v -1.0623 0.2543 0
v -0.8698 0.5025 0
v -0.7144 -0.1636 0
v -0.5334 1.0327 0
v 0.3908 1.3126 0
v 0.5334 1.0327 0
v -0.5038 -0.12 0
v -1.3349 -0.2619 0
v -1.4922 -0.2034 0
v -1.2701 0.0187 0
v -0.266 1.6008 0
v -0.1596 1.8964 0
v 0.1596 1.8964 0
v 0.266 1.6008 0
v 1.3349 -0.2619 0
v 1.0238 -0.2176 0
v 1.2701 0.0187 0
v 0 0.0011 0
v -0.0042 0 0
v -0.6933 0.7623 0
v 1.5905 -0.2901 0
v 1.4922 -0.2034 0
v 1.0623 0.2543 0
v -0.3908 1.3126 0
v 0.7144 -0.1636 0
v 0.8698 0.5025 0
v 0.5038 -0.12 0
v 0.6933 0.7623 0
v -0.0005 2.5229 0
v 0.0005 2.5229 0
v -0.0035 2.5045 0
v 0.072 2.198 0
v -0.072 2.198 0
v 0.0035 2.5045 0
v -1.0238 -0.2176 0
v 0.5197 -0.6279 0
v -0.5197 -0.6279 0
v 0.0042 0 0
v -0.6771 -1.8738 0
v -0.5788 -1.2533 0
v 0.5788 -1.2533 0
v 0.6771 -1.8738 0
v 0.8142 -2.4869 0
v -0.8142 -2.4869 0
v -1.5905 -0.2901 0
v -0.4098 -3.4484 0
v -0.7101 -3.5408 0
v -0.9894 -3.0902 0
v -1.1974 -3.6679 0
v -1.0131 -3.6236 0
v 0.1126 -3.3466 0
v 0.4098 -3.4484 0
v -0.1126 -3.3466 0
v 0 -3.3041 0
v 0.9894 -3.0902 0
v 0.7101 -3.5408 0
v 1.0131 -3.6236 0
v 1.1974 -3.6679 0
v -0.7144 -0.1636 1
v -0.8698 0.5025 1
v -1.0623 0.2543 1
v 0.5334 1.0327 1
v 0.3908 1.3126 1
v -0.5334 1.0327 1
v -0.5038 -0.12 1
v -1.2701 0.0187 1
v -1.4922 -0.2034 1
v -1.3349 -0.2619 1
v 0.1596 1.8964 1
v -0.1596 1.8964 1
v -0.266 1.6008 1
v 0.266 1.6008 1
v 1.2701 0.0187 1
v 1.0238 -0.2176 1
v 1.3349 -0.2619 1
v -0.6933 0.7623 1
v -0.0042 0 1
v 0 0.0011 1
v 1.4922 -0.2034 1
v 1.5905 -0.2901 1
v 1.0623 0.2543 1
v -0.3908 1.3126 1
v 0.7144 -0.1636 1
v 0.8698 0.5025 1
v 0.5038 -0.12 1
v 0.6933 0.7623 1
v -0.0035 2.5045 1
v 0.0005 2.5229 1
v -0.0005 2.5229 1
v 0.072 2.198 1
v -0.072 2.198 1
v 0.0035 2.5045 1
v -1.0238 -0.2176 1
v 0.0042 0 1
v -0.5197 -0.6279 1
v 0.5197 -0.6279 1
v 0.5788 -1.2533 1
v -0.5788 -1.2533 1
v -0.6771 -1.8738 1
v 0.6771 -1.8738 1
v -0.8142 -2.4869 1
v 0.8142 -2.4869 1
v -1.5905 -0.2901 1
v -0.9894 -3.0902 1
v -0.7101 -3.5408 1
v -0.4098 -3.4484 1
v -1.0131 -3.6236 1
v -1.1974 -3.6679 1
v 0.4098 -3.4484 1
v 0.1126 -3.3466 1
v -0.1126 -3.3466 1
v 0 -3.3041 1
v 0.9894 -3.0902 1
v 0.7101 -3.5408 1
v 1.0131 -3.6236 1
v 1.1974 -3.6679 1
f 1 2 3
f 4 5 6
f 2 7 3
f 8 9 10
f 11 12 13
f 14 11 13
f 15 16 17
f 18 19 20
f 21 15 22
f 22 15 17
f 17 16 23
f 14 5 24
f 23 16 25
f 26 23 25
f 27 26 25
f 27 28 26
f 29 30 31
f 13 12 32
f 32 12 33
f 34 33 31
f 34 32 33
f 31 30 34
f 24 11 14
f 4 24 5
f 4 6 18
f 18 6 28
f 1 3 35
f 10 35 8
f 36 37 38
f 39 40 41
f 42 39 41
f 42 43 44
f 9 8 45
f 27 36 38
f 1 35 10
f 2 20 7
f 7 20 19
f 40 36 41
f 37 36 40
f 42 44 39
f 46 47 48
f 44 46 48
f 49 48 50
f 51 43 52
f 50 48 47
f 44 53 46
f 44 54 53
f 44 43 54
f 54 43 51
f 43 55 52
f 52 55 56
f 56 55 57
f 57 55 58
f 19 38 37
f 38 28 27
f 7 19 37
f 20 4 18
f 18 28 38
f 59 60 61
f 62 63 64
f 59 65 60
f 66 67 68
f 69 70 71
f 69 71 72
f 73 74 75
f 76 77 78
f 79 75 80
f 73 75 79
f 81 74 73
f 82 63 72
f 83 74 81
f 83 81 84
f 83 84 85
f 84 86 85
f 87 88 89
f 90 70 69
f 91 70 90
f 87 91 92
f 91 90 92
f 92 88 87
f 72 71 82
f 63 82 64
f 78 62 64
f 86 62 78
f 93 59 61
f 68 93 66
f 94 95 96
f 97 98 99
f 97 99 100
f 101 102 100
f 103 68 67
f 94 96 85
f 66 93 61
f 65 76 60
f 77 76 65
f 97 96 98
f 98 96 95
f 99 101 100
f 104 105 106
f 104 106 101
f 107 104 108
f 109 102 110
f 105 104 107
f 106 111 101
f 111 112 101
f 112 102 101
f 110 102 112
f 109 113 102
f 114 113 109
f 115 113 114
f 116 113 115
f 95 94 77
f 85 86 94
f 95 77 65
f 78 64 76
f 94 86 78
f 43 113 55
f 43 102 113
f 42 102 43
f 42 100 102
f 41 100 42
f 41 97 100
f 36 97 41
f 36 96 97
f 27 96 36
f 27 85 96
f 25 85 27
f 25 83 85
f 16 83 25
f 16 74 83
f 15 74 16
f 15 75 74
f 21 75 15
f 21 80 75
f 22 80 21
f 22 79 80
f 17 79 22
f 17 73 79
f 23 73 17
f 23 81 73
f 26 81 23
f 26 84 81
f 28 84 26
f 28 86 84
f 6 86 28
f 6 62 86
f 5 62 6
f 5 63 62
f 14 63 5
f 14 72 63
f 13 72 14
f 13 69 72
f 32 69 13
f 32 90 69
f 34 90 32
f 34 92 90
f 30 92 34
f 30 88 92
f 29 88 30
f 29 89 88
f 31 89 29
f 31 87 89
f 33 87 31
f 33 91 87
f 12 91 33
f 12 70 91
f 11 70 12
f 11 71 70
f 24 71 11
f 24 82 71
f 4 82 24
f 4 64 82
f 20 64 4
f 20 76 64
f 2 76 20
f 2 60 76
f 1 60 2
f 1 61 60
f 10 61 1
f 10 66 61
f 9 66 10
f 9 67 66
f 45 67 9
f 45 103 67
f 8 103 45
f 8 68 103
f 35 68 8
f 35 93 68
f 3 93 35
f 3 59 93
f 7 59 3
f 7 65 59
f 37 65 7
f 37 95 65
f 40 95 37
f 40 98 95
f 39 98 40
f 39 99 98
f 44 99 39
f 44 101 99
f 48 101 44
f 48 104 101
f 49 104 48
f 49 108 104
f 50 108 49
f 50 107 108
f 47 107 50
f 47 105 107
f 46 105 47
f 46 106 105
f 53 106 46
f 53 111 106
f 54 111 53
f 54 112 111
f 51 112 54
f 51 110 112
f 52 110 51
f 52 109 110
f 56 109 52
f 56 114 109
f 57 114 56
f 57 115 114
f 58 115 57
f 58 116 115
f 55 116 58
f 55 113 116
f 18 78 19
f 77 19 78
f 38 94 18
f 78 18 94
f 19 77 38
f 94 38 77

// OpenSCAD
//Name: Curvy Arrow
//Created by Ari M. Diacou, April-June 2015
//Shared under Creative Commons License: Attribution-ShareAlike 3.0 Unported (CC BY-SA 3.0) 
//see http://creativecommons.org/licenses/by-sa/3.0/

//INSTRUCTIONS:
/* The code below produces an arrow with curvy edges. It does this by intersecting and taking the difference of 4 pairs of circles. 2 circles form the tip of the arrow (set1), and 2 form the back of the tip of the arrow(set2). The sides of the shaft are formed by set3, and the tail of the arrow is formed by set 4. 

The circles are specified by a modified polar coordinate system called "easy_form" which is ={distance from origin to circle edge, radius of circle, angle between +x-axis and cicle center in degrees}. This coordinate system is SLIGHTLY easier to get a grasp of entering values. Changing the first value will push a curve farther from the origin (the center of the arrow). Lowering the 2nd number will make a line more curvy (by lowering the radius of the circle it creates). Raising the 2nd number will make a line more flat (by increasing the radius of the circle it creates). Changing the 3rd number is how you get position control. The 3rd number is the angle that the angle that the line connecting the origin and the center of the circle will make with the x-axis.Both the first and the third parameters can be negative. Negative radii will fail silently.

It is highly reccommended that this program be used in OpenSCAD and not customizer. There is no input checking, and a lot of edge cases where circles will not intersect. If instead of an arrow looking thing, cutomizer or OpenSCAD show you two circles floating in space, it means that the circles are not intersecting, and the program is failing silently. If you wish to make a 2D file, use 0 for the height (I dont think this works in customizer).

The last 4 functions in this program are used to calculate the points where the circles intersect, which is used to calculate the length and width of the arrow. This information is available through the echo function, and not visible in customizer. So if you want to know the dimensions of your arrow, use OpenSCAD.*/

//The tip of the arrow [origin to edge, radius, polar position angle] e.g. [1,5,35]
set1=[1,5,35];      
//The back of the arrow tip [origin to edge, radius, polar position angle] e.g. [0,10,75]
set2=[0,10,75];     
//The sides of the shaft [origin to edge, radius, polar position angle] e.g. [.5,10,0]
set3=[.5,10,0];      
//The back of the shaft [origin to edge, radius, polar position angle] e.g. [-1.5,10,60]
set4=[-3,10,60];
//Height of your arrow, use 0 offline to output a DXF file
height=1;

/* HIDDEN */
///// Derived Parameters /////
ep=0.05; //epsilon, a small number
tip= intersection(set1,[set1[0],set1[1],180-set1[2]]); echo(str("tip=",tip));
back=intersection(set3,set4); echo(str("back = ",back));
side=intersection(set1,set2); echo(str("side = ",side));
length=tip[1]-back[1]; echo(str("length = ",length));
width=2*max(side[0],back[0]); echo(str("width = ", width));
//real_height = height < ep ? ep : height; //input handl
/////////// MAIN() //////////
//if the height is less than epsilon, output a 2D file, else: output a 3D file with the specified height. I dont know if customizer can output DXF files, so I think this will only work in OpenSCAD.
if(height < ep)
    arrow();
else
    linear_extrude(height) arrow();
echo(str(
    "A suggested name for your arrow is: curvy_arrow-sets=[",set1,set2,set3,set4,"],h=",height
    ));
///////// FUNCTIONS /////////
function intersection(circle1,circle2)=(norm(intersections(circle1,circle2)[0])<=norm(intersections(circle1,circle2)[1]))?intersections(circle1,circle2)[0]:intersections(circle1,circle2)[1];
function xyr_form(easy_form)=[
    //easy_form={distance from origin to circle edge, radius of circle,angle between +x-axis and cicle center}
    //xyr_form={x-cooridante of center,y-coordinate of center,radius of circle}
    (easy_form[0]+easy_form[1])*cos(easy_form[2]), //x=(diff+r)*cos(theta)
    (easy_form[0]+easy_form[1])*sin(easy_form[2]), //y=(diff+r)*sin(theta)
    easy_form[1] //r
    ];
module arrow(){
    top();
    bottom();
    }
module top(){ //The tip of the arrow
    difference(){
        intersection(){
            square(2*tip[1],center=true);
            pair(set2,$fn=200); //The back of the arrow
            }
        pair(set1,$fn=100); //The tip of the arrow
        }
    }
module bottom(){ //The shaft of the arrow
    difference(){
        intersection(){
            translate([0,-2.5,0])
                square(5,center=true);
            pair(set4,$fn=200); //The sides of the shaft
            }
        pair(set3,$fn=100); //The backof the shaft
        }
    }
function chord_of_circle_intersection(d,r,R)=(1/d)*sqrt(4*d*d*R*R-pow(d*d-r*r+R*R,2)); //from: http://mathworld.wolfram.com/Circle-CircleIntersection.html, Equation 8
module pair(triplet){
    /* Makes a pair of circles on the x-y plane for making the 8 arcs of the arrow. An array "triplet" is passed into the function which specifies the position and size of the circles. The 2nd parameter is the radius of the circles, the third is the angle that the line connecting the origin and the center of the circle will make with the x-axis, and the first parameter of the array is the distance between the origin and the nearest edge of the circle. Both the first and the third parameters can be negative. Negative radii will fail silently.*/
    radius=triplet[1]; 
    x=xyr_form(triplet)[0];
    y=xyr_form(triplet)[1];
    translate([x,y,0])
        circle(radius);
    translate([-x,y,0])
        circle(radius);
}
function intersections(circle1,circle2)=[
    [x1sol(xyr_form(circle1)[0],xyr_form(circle1)[1],xyr_form(circle1)[2],xyr_form(circle2)[0],xyr_form(circle2)[1],xyr_form(circle2)[2]),
    y1sol(xyr_form(circle1)[0],xyr_form(circle1)[1],xyr_form(circle1)[2],xyr_form(circle2)[0],xyr_form(circle2)[1],xyr_form(circle2)[2])],
    [x2sol(xyr_form(circle1)[0],xyr_form(circle1)[1],xyr_form(circle1)[2],xyr_form(circle2)[0],xyr_form(circle2)[1],xyr_form(circle2)[2]),
    y2sol(xyr_form(circle1)[0],xyr_form(circle1)[1],xyr_form(circle1)[2],xyr_form(circle2)[0],xyr_form(circle2)[1],xyr_form(circle2)[2])]
    ];
//The following are the solutions to the intersection of two circles with arbitrary radius and coordinates. Solved with Mathematica (9 Student/Home) on a Raspberry Pi using the algorithm discussed here: http://mathematica.stackexchange.com/questions/80695/formatting-an-equation-xy-to-powx-y, with many thanks to all the respondants. A circle intersects another at 0, 1 or 2 points. If circles do not intersect, then the following solutions would ideally be complex numbers. If they intersect at 1 point then (x1sol,x2sol)=(x2sol,y2sol). In the case of sensible inputs which create an arrow like we have in this program, there will be 2 solutions. In our case we will take the one that is closer to the origin. This will allow us to calculate the length and width of the arrow, so it can be scaled later.
function x1sol(x1,y1,r1,x2,y2,r2)=x1 + (r1*(((-x1 + x2)*(-((-1 + pow(r2,2)/pow(r1,2))/sqrt(pow(-x1 + x2,2)/pow(r1,2) + pow(-y1 + y2,2)/pow(r1,2))) + sqrt(pow(-x1 + x2,2)/pow(r1,2) + pow(-y1 + y2,2)/pow(r1,2))))/(2.*r1) + ((-y1 + y2)*sqrt((1 + ((-1 + pow(r2,2)/pow(r1,2))/sqrt(pow(-x1 + x2,2)/pow(r1,2) + pow(-y1 + y2,2)/pow(r1,2)) - sqrt(pow(-x1 + x2,2)/pow(r1,2) + pow(-y1 + y2,2)/pow(r1,2)))/2.)*(1 + (-((-1 + pow(r2,2)/pow(r1,2))/sqrt(pow(-x1 + x2,2)/pow(r1,2) + pow(-y1 + y2,2)/pow(r1,2))) + sqrt(pow(-x1 + x2,2)/pow(r1,2) + pow(-y1 + y2,2)/pow(r1,2)))/2.)))/r1))/sqrt(pow(-x1 + x2,2)/pow(r1,2) + pow(-y1 + y2,2)/pow(r1,2));
function y1sol(x1,y1,r1,x2,y2,r2)=y1 + (r1*(((-y1 + y2)*(-((-1 + pow(r2,2)/pow(r1,2))/sqrt(pow(-x1 + x2,2)/pow(r1,2) + pow(-y1 + y2,2)/pow(r1,2))) + sqrt(pow(-x1 + x2,2)/pow(r1,2) + pow(-y1 + y2,2)/pow(r1,2))))/(2.*r1) - ((-x1 + x2)*sqrt((1 + ((-1 + pow(r2,2)/pow(r1,2))/sqrt(pow(-x1 + x2,2)/pow(r1,2) + pow(-y1 + y2,2)/pow(r1,2)) - sqrt(pow(-x1 + x2,2)/pow(r1,2) + pow(-y1 + y2,2)/pow(r1,2)))/2.)*(1 + (-((-1 + pow(r2,2)/pow(r1,2))/sqrt(pow(-x1 + x2,2)/pow(r1,2) + pow(-y1 + y2,2)/pow(r1,2))) + sqrt(pow(-x1 + x2,2)/pow(r1,2) + pow(-y1 + y2,2)/pow(r1,2)))/2.)))/r1))/sqrt(pow(-x1 + x2,2)/pow(r1,2) + pow(-y1 + y2,2)/pow(r1,2));
function x2sol(x1,y1,r1,x2,y2,r2)=x1 + (r1*(((-x1 + x2)*(-((-1 + pow(r2,2)/pow(r1,2))/sqrt(pow(-x1 + x2,2)/pow(r1,2) + pow(-y1 + y2,2)/pow(r1,2))) + sqrt(pow(-x1 + x2,2)/pow(r1,2) + pow(-y1 + y2,2)/pow(r1,2))))/(2.*r1) - ((-y1 + y2)*sqrt((1 + ((-1 + pow(r2,2)/pow(r1,2))/sqrt(pow(-x1 + x2,2)/pow(r1,2) + pow(-y1 + y2,2)/pow(r1,2)) - sqrt(pow(-x1 + x2,2)/pow(r1,2) + pow(-y1 + y2,2)/pow(r1,2)))/2.)*(1 + (-((-1 + pow(r2,2)/pow(r1,2))/sqrt(pow(-x1 + x2,2)/pow(r1,2) + pow(-y1 + y2,2)/pow(r1,2))) + sqrt(pow(-x1 + x2,2)/pow(r1,2) + pow(-y1 + y2,2)/pow(r1,2)))/2.)))/r1))/sqrt(pow(-x1 + x2,2)/pow(r1,2) + pow(-y1 + y2,2)/pow(r1,2));
function y2sol(x1,y1,r1,x2,y2,r2)=y1 + (r1*(((-y1 + y2)*(-((-1 + pow(r2,2)/pow(r1,2))/sqrt(pow(-x1 + x2,2)/pow(r1,2) + pow(-y1 + y2,2)/pow(r1,2))) + sqrt(pow(-x1 + x2,2)/pow(r1,2) + pow(-y1 + y2,2)/pow(r1,2))))/(2.*r1) + ((-x1 + x2)*sqrt((1 + ((-1 + pow(r2,2)/pow(r1,2))/sqrt(pow(-x1 + x2,2)/pow(r1,2) + pow(-y1 + y2,2)/pow(r1,2)) - sqrt(pow(-x1 + x2,2)/pow(r1,2) + pow(-y1 + y2,2)/pow(r1,2)))/2.)*(1 + (-((-1 + pow(r2,2)/pow(r1,2))/sqrt(pow(-x1 + x2,2)/pow(r1,2) + pow(-y1 + y2,2)/pow(r1,2))) + sqrt(pow(-x1 + x2,2)/pow(r1,2) + pow(-y1 + y2,2)/pow(r1,2)))/2.)))/r1))/sqrt(pow(-x1 + x2,2)/pow(r1,2) + pow(-y1 + y2,2)/pow(r1,2));
